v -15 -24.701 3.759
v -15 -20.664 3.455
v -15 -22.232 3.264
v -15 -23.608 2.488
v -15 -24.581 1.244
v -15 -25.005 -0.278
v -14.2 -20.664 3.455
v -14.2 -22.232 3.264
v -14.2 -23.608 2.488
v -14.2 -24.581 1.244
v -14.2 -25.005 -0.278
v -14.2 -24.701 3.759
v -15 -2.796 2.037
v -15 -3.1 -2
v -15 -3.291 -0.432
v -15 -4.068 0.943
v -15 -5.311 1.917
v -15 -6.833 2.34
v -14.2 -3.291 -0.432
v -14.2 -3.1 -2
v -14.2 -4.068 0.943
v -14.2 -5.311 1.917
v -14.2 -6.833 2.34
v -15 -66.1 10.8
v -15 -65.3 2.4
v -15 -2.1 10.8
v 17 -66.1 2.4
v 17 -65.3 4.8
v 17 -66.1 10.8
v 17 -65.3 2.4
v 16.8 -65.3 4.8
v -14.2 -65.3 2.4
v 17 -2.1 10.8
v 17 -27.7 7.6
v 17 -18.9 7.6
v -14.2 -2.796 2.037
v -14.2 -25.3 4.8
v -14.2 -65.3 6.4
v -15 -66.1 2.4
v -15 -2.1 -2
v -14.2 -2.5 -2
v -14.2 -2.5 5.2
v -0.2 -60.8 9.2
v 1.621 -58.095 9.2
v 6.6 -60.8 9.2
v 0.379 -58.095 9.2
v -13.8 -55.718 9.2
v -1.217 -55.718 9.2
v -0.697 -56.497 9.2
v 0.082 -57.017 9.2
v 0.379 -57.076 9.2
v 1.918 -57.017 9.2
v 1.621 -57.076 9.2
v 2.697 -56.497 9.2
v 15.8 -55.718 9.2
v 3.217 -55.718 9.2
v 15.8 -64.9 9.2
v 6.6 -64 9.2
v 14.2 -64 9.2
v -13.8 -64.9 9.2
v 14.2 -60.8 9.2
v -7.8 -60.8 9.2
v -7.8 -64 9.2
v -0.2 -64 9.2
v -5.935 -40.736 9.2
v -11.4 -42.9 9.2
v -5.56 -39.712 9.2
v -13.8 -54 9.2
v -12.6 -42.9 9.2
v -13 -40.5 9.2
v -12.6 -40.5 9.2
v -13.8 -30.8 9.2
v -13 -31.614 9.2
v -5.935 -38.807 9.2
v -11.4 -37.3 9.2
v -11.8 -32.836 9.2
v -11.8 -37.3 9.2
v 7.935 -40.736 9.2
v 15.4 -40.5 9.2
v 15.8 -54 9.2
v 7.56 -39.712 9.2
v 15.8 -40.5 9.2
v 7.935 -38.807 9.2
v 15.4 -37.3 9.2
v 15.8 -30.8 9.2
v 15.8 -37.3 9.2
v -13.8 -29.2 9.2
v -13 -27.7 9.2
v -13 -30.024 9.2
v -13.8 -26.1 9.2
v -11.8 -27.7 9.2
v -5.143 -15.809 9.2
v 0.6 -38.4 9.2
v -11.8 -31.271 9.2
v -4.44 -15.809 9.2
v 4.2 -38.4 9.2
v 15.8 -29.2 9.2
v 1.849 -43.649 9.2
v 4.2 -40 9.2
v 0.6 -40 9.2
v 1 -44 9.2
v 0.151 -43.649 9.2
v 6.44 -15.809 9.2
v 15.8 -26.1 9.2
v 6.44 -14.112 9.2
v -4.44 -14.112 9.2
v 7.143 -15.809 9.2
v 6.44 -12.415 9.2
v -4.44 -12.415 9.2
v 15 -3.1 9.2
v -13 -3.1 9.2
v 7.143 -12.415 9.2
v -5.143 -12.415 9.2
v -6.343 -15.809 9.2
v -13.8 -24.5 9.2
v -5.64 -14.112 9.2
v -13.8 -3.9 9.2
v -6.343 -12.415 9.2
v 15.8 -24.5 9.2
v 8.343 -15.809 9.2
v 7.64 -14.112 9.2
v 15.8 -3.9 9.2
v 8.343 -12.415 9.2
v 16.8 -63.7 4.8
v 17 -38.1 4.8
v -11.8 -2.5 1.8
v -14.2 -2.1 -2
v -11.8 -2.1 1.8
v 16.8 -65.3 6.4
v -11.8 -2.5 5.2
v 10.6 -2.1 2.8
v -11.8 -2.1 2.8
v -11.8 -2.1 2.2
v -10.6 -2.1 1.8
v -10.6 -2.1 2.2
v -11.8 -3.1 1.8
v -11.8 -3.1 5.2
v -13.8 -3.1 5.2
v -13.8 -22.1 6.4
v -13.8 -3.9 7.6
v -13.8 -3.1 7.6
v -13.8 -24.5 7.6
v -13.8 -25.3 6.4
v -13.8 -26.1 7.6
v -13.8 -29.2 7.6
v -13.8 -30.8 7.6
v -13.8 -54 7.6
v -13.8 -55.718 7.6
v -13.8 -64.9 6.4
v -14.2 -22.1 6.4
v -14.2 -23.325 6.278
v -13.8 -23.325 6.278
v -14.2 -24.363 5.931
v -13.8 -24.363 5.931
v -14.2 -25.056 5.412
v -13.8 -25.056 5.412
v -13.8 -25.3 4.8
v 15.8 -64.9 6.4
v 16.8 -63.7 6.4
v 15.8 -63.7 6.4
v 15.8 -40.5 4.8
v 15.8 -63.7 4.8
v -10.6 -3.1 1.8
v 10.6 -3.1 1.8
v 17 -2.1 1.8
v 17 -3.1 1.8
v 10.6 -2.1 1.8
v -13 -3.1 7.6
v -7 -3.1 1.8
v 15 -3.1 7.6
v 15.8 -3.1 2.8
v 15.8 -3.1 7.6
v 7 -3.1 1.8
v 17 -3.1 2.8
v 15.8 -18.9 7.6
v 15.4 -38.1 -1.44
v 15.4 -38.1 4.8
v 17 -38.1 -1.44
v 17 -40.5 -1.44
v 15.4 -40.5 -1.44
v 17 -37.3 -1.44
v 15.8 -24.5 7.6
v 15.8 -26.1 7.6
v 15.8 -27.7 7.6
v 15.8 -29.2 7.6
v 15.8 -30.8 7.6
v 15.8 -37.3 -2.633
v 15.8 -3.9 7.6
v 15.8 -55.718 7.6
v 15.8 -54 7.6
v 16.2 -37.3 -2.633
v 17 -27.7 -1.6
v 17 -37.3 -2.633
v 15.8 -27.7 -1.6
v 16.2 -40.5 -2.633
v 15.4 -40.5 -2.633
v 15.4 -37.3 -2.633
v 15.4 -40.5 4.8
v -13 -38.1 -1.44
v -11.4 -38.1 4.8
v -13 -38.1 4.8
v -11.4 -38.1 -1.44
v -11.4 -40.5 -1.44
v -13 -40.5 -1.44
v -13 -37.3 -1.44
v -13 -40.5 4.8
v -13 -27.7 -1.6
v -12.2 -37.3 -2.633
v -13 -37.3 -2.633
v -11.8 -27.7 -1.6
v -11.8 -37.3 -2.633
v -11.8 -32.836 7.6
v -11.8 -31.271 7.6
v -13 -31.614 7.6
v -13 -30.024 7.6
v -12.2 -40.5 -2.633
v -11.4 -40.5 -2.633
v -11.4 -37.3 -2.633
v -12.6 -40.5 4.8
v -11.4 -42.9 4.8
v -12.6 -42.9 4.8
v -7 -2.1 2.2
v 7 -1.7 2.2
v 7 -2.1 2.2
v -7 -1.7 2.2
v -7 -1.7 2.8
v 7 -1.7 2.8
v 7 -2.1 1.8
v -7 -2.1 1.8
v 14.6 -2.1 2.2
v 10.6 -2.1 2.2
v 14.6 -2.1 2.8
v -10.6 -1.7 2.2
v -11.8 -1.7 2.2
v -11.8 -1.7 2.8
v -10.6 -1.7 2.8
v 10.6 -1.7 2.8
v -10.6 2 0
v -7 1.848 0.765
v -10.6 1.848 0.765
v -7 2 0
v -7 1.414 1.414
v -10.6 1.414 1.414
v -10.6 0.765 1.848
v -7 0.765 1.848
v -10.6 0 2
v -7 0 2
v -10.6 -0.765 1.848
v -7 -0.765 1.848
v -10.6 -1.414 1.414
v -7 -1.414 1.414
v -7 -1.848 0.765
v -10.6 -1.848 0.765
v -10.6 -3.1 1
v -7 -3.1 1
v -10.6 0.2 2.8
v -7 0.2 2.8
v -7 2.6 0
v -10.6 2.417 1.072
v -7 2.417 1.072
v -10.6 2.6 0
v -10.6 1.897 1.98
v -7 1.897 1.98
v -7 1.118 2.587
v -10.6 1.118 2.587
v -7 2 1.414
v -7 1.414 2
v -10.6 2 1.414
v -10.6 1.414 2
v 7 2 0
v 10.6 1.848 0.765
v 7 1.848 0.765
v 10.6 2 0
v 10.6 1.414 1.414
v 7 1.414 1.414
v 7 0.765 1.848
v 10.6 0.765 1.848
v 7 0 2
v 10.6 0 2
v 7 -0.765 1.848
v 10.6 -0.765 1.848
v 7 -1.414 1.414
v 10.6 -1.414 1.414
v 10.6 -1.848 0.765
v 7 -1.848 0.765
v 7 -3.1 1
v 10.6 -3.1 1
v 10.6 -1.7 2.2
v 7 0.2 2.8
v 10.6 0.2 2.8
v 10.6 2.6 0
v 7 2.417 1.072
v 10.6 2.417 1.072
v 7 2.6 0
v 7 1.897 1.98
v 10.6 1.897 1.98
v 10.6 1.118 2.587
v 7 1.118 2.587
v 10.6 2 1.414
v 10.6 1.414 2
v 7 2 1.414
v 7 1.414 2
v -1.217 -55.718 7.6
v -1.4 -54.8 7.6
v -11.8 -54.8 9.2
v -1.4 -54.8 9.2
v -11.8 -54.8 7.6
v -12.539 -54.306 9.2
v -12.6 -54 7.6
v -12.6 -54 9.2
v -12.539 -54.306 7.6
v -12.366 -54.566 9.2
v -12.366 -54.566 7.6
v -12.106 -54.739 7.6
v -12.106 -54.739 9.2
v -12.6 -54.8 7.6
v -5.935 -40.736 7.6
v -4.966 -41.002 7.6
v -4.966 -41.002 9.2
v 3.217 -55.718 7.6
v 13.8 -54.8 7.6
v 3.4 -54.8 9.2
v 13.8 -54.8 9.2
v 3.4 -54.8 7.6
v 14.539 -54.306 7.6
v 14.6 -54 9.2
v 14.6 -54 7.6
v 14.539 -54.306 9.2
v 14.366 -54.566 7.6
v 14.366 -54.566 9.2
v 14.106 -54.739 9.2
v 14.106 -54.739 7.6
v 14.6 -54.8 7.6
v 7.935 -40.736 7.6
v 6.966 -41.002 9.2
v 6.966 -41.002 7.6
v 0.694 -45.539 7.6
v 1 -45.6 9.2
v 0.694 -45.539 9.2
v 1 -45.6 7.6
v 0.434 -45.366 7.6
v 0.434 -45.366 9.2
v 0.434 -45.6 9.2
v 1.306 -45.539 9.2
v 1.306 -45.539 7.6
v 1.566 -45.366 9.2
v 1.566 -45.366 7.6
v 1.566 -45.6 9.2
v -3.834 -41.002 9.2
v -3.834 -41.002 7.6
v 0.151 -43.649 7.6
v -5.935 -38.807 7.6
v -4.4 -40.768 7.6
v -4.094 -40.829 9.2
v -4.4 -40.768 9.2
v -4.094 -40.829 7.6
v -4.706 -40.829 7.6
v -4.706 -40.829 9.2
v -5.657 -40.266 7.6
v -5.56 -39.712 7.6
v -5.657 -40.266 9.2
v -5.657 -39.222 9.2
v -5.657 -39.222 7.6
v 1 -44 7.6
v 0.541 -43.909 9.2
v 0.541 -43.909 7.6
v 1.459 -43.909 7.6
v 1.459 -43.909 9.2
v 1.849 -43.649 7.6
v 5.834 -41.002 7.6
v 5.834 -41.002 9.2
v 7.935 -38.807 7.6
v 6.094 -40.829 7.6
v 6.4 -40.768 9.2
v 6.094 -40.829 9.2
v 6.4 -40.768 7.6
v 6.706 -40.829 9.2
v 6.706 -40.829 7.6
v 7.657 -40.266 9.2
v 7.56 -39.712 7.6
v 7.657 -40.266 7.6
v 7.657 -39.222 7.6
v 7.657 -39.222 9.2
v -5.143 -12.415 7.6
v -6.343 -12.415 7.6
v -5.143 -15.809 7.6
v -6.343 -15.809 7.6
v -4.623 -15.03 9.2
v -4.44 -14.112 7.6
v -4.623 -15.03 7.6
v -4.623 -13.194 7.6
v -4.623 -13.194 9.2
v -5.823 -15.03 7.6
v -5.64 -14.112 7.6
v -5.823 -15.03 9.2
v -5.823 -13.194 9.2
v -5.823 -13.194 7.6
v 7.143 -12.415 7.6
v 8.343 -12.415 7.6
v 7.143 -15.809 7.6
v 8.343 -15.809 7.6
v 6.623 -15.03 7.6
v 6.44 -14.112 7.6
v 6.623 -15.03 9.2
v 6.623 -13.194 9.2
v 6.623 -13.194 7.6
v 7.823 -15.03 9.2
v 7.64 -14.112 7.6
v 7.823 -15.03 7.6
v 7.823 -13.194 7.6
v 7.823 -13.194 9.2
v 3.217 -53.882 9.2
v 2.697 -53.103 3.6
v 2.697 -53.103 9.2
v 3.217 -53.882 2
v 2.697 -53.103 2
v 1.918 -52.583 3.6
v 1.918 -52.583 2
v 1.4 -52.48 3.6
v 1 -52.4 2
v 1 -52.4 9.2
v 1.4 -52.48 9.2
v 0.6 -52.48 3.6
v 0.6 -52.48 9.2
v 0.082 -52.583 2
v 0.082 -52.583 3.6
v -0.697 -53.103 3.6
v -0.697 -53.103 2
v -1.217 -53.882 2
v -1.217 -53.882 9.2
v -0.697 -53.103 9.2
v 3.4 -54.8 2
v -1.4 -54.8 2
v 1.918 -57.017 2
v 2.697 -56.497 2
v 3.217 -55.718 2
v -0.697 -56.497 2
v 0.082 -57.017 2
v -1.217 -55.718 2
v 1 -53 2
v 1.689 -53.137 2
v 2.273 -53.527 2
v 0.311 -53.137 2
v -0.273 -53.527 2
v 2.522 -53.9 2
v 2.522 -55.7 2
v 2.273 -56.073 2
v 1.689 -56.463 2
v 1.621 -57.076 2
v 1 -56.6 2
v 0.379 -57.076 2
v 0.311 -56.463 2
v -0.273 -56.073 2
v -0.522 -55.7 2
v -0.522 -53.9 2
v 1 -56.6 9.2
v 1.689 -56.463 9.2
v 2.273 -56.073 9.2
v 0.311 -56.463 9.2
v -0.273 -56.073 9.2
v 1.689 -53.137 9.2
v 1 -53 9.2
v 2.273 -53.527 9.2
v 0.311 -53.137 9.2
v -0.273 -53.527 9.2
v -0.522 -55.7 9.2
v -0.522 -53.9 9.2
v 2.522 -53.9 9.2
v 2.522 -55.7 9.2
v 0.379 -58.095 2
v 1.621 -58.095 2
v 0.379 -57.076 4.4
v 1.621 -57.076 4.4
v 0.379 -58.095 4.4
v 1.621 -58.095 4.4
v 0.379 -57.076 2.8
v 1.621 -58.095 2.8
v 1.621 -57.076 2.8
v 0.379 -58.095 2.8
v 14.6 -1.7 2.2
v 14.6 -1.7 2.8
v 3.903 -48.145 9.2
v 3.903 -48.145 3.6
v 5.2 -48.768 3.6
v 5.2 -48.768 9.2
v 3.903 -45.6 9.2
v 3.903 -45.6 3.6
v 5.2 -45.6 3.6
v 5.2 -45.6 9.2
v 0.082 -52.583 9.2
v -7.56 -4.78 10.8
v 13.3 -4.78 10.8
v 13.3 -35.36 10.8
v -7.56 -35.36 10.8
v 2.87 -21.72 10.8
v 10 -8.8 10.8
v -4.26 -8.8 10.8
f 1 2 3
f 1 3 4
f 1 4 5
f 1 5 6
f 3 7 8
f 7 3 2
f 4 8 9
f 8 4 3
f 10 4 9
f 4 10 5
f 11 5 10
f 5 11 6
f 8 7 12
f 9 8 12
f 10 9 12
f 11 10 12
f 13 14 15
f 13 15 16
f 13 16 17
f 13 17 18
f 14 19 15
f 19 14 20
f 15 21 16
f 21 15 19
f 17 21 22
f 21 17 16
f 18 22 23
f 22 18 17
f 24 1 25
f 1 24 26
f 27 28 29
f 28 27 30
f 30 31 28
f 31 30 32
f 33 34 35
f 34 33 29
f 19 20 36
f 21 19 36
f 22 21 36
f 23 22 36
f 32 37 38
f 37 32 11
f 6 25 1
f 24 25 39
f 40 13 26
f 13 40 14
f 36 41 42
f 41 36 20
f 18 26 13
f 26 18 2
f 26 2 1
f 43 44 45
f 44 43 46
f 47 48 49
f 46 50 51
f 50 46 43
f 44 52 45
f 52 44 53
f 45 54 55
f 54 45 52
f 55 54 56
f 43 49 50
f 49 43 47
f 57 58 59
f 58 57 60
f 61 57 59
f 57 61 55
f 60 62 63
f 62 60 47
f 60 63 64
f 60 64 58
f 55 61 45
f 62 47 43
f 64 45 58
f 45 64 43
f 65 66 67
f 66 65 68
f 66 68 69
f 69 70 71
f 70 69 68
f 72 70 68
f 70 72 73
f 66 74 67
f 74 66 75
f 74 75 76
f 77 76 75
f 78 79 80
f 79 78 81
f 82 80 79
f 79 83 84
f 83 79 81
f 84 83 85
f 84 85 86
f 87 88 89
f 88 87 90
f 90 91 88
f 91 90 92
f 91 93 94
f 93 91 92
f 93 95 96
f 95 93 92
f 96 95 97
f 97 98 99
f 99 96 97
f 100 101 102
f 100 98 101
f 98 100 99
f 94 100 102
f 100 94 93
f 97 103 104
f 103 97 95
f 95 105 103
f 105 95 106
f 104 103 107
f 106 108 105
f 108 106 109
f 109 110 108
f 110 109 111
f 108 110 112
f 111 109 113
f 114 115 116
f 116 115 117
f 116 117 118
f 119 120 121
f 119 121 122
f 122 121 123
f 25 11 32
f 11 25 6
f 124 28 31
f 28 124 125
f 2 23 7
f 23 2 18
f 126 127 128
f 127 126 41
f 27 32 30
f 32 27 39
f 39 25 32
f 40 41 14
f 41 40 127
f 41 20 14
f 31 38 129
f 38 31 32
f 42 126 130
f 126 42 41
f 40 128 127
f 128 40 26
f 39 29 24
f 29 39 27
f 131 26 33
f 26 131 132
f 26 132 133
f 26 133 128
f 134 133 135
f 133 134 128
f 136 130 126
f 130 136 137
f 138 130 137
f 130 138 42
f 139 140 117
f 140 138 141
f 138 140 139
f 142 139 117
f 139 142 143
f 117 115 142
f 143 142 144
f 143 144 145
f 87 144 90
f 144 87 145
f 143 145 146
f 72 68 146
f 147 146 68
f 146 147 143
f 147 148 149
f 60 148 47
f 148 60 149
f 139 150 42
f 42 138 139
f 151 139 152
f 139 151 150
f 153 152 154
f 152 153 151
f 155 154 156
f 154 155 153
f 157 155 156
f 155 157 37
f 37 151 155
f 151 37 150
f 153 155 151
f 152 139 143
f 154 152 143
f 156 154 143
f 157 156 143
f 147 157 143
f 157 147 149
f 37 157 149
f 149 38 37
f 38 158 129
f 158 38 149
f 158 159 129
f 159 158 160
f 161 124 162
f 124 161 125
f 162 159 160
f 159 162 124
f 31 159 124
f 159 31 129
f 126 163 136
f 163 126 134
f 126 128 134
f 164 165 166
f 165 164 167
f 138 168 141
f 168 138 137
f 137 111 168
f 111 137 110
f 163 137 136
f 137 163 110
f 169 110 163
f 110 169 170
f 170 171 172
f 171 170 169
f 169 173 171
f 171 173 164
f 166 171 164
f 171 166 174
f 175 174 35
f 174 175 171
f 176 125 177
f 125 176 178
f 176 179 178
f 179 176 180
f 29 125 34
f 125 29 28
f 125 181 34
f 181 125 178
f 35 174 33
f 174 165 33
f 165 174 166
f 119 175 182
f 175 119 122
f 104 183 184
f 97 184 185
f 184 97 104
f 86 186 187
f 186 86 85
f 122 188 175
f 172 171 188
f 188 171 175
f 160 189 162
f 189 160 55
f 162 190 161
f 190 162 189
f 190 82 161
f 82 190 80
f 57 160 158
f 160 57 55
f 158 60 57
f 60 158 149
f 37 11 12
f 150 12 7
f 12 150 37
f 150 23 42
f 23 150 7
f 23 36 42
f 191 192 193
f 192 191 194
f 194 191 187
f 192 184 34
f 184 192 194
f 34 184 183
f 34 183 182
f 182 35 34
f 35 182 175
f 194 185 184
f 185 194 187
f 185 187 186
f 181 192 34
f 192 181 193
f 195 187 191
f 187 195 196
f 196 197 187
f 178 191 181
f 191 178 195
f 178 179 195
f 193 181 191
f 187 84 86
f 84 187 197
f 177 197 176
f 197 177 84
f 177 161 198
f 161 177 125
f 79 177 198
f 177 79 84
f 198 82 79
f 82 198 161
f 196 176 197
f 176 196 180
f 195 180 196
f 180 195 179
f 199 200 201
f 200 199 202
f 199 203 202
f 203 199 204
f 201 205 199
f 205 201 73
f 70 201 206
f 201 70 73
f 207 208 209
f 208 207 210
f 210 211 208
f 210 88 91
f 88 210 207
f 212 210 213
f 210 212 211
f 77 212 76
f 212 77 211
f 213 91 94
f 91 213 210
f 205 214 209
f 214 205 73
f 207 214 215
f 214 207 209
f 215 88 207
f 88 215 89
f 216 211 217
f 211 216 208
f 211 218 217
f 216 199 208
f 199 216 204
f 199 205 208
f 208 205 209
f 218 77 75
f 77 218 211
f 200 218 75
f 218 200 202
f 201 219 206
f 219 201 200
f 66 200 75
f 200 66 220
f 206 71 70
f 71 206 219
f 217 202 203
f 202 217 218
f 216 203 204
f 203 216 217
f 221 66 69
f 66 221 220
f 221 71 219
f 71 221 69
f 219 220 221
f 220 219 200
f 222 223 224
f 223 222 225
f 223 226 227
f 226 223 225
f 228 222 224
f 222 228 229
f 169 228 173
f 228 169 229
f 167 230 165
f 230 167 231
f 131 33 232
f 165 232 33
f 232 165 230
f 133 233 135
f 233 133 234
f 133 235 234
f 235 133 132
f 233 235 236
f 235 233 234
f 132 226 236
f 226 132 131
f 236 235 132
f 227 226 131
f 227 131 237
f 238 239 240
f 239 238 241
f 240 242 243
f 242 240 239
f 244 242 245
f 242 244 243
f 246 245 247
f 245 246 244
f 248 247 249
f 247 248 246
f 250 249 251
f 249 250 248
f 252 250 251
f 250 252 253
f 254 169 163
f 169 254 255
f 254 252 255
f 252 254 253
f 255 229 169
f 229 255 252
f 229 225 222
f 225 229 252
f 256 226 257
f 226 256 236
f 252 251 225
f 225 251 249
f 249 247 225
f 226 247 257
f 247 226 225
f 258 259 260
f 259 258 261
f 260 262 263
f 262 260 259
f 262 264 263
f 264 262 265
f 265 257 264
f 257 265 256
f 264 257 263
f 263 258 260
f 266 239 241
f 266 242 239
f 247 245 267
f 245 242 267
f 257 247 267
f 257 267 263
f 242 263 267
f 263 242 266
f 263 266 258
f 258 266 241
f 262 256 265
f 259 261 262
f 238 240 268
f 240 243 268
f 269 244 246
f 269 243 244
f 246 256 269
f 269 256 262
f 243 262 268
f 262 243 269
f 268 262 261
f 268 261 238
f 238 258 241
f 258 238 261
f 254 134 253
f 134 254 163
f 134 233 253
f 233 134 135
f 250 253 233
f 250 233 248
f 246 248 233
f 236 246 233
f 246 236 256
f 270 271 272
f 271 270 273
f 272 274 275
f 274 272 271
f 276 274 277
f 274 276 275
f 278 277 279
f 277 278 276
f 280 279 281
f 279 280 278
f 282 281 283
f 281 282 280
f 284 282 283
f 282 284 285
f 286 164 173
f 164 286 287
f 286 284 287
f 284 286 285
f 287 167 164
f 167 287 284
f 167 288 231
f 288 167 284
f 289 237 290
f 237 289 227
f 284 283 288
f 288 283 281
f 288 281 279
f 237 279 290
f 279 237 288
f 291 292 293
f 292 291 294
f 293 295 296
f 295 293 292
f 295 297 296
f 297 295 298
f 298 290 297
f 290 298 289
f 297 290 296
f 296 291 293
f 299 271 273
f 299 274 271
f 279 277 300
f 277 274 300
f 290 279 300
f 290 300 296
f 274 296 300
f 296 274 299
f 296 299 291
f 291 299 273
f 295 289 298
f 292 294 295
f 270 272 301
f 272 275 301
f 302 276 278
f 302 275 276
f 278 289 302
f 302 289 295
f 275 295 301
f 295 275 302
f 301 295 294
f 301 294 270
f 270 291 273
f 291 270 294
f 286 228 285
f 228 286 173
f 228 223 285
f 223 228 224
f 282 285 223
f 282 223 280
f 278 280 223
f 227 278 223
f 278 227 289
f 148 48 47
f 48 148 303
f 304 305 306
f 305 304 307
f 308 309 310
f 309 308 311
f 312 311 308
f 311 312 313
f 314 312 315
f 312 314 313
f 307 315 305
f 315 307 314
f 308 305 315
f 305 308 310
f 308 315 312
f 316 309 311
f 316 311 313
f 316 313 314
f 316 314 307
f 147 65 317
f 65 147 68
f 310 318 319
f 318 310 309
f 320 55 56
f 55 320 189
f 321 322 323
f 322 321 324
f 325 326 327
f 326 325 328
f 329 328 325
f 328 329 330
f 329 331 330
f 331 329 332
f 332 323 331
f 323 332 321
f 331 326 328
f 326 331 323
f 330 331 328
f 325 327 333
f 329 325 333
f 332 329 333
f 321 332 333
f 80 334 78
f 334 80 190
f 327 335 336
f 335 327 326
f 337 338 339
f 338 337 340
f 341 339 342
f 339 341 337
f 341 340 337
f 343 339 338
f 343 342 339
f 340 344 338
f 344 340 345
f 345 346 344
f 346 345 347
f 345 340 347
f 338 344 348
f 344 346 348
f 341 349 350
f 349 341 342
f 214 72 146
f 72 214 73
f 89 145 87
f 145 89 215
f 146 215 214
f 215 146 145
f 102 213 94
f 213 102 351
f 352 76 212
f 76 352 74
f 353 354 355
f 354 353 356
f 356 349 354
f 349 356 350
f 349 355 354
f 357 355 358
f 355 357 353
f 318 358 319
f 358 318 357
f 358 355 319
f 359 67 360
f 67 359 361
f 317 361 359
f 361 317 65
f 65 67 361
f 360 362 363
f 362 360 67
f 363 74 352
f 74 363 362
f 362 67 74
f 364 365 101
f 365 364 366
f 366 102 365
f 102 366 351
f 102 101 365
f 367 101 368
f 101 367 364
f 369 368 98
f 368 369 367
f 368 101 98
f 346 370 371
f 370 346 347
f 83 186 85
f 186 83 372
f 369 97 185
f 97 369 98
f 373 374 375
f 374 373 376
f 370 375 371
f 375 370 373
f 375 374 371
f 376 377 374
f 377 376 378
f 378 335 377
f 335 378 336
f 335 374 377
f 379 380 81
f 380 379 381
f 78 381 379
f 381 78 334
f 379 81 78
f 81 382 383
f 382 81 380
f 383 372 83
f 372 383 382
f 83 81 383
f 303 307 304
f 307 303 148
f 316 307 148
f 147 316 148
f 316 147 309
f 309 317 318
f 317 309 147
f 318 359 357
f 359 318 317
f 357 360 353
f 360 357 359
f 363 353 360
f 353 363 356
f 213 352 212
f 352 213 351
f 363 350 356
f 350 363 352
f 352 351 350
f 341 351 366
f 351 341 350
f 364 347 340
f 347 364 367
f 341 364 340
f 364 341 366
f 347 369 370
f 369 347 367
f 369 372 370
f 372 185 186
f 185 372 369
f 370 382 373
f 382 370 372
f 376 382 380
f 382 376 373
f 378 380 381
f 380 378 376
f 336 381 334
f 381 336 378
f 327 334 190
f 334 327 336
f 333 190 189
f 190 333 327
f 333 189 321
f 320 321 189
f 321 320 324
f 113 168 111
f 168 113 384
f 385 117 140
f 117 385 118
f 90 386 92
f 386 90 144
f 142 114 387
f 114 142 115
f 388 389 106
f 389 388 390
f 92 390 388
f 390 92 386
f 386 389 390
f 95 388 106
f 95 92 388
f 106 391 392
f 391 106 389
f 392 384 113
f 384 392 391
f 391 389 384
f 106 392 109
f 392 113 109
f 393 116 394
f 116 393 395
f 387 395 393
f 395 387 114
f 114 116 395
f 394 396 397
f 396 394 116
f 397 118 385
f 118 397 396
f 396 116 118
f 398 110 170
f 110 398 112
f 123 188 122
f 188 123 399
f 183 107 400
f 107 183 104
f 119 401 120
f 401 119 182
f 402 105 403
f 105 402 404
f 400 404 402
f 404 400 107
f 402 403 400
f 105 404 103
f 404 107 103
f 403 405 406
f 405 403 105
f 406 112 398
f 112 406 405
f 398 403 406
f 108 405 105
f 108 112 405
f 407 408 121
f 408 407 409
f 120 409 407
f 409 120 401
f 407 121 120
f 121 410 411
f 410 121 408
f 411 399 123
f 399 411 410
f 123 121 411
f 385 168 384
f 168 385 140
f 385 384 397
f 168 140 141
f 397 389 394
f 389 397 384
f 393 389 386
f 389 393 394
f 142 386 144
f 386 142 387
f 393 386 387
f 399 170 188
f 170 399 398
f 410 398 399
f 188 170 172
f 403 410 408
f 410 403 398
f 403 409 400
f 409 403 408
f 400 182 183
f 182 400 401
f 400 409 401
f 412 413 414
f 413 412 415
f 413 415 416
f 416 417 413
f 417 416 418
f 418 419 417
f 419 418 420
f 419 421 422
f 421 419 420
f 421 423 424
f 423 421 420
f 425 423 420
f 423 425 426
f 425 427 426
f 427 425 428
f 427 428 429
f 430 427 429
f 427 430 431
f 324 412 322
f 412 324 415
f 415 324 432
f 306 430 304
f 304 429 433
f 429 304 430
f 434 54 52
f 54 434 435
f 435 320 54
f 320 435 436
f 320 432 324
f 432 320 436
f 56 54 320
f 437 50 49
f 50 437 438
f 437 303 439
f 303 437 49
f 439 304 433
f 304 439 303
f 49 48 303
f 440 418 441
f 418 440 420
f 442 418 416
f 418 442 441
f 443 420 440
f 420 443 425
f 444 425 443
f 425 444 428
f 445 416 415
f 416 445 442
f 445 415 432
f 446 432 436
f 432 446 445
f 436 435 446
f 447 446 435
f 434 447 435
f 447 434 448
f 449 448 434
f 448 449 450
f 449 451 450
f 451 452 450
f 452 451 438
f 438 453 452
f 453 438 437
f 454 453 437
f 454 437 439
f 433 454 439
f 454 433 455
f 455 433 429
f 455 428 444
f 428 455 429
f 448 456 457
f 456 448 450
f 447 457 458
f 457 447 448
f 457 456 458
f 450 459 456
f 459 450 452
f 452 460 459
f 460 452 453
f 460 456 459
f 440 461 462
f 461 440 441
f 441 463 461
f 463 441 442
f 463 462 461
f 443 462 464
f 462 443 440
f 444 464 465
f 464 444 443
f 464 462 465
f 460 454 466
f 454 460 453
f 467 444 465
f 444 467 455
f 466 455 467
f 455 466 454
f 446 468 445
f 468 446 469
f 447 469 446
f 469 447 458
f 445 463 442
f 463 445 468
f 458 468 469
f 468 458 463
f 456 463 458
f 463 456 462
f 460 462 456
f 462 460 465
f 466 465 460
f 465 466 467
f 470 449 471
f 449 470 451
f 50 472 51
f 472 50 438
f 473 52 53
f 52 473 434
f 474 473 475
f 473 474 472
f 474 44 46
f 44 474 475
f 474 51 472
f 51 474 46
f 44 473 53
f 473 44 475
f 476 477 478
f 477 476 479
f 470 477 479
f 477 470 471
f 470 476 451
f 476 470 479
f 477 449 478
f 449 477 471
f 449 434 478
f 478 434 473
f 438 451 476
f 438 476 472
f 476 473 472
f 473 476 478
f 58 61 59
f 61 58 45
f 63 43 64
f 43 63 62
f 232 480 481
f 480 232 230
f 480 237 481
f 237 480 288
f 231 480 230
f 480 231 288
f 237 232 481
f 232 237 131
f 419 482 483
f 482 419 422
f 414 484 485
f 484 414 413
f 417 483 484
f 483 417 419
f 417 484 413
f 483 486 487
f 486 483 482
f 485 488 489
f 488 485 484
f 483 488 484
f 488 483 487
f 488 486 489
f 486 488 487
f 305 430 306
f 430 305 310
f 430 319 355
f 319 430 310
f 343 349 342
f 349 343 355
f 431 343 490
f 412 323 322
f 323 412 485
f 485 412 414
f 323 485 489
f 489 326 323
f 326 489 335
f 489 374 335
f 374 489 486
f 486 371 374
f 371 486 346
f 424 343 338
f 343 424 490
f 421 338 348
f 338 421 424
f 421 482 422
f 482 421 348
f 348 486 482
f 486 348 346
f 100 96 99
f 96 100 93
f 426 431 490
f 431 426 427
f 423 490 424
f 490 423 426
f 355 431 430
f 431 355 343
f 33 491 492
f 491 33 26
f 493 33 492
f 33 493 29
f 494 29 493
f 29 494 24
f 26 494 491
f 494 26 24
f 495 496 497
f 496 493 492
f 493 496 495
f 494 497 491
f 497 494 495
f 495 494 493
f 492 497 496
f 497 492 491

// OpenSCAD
use <../lib.scad>
use <s/4112s01.scad>
use <s/4112s03.scad>
function ldraw_lib__4112p04() = [
// 0 ~Electric Switch: Key Left with Yellow Triangle Down Pattern
// 0 Name: 4112p04.dat
// 0 Author: Javier Orquera [kuramapika1]
// 0 !LDRAW_ORG Part UPDATE 2025-09
// 0 !LICENSE Licensed under CC BY 4.0 : see CAreadme.txt
// 
// 0 !HELP to put this part into a pressed-down state, rotate it 4.3 degrees
// 0 !HELP around the x-axis
// 
// 0 BFC CERTIFY CCW
  [0,"BFC","CERTIFY"],
  [0,"BFC","CCW"],
// 
// 0 !KEYWORDS set 7862, switch, Train
// 
// 0 !HISTORY 2025-04-24 [kuramapika1] Adapted surfaces
// 0 !HISTORY 2025-09-11 [kuramapika1] Use of new subfile
// 0 !HISTORY 2025-09-29 [OrionP] Official Update 2025-09
// 
// 1 16 0 0 0 1 0 0 0 1 0 0 0 1 s\4112s01.dat
  [1,16,0,0,0,1,0,0,0,1,0,0,0,1, ldraw_lib__s__4112s01()],
// 1 16 0 0 0 1 0 0 0 1 0 0 0 1 s\4112s03.dat
  [1,16,0,0,0,1,0,0,0,1,0,0,0,1, ldraw_lib__s__4112s03()],
// 4 16 -18.9 -27 -11.95 33.25 -27 -11.95 42.5 -27 -5.25 -37.5 -27 -5.25
  [4,16,-18.9,-27,-11.95,33.25,-27,-11.95,42.5,-27,-5.25,-37.5,-27,-5.25],
// 4 16 42.5 -27 -5.25 33.25 -27 -11.95 33.25 -27 -88.4 42.5 -27 -165.25
  [4,16,42.5,-27,-5.25,33.25,-27,-11.95,33.25,-27,-88.4,42.5,-27,-165.25],
// 4 16 -37.5 -27 -165.25 42.5 -27 -165.25 33.25 -27 -88.4 -18.9 -27 -88.4
  [4,16,-37.5,-27,-165.25,42.5,-27,-165.25,33.25,-27,-88.4,-18.9,-27,-88.4],
// 4 16 -18.9 -27 -11.95 -37.5 -27 -5.25 -37.5 -27 -165.25 -18.9 -27 -88.4
  [4,16,-18.9,-27,-11.95,-37.5,-27,-5.25,-37.5,-27,-165.25,-18.9,-27,-88.4],
// 3 14 7.175 -27 -54.3 25 -27 -22 -10.65 -27 -22
  [3,14,7.175,-27,-54.3,25,-27,-22,-10.65,-27,-22],
// 4 0 33.25 -27 -11.95 25 -27 -22 7.175 -27 -54.3 33.25 -27 -88.4
  [4,0,33.25,-27,-11.95,25,-27,-22,7.175,-27,-54.3,33.25,-27,-88.4],
// 4 0 -10.65 -27 -22 -18.9 -27 -11.95 -18.9 -27 -88.4 7.175 -27 -54.3
  [4,0,-10.65,-27,-22,-18.9,-27,-11.95,-18.9,-27,-88.4,7.175,-27,-54.3],
// 3 0 7.175 -27 -54.3 -18.9 -27 -88.4 33.25 -27 -88.4
  [3,0,7.175,-27,-54.3,-18.9,-27,-88.4,33.25,-27,-88.4],
// 4 0 33.25 -27 -11.95 -18.9 -27 -11.95 -10.65 -27 -22 25 -27 -22
  [4,0,33.25,-27,-11.95,-18.9,-27,-11.95,-10.65,-27,-22,25,-27,-22],
];
module ldraw_lib__4112p04(step=0, col=false, unit=2/5, alt=false, line=0.2, solid=!$preview)
    makepoly(ldraw_lib__4112p04(), step=step, col=col, unit=unit, alt=alt, line=line, solid=solid);
ldraw_lib__4112p04(line=0.2);
